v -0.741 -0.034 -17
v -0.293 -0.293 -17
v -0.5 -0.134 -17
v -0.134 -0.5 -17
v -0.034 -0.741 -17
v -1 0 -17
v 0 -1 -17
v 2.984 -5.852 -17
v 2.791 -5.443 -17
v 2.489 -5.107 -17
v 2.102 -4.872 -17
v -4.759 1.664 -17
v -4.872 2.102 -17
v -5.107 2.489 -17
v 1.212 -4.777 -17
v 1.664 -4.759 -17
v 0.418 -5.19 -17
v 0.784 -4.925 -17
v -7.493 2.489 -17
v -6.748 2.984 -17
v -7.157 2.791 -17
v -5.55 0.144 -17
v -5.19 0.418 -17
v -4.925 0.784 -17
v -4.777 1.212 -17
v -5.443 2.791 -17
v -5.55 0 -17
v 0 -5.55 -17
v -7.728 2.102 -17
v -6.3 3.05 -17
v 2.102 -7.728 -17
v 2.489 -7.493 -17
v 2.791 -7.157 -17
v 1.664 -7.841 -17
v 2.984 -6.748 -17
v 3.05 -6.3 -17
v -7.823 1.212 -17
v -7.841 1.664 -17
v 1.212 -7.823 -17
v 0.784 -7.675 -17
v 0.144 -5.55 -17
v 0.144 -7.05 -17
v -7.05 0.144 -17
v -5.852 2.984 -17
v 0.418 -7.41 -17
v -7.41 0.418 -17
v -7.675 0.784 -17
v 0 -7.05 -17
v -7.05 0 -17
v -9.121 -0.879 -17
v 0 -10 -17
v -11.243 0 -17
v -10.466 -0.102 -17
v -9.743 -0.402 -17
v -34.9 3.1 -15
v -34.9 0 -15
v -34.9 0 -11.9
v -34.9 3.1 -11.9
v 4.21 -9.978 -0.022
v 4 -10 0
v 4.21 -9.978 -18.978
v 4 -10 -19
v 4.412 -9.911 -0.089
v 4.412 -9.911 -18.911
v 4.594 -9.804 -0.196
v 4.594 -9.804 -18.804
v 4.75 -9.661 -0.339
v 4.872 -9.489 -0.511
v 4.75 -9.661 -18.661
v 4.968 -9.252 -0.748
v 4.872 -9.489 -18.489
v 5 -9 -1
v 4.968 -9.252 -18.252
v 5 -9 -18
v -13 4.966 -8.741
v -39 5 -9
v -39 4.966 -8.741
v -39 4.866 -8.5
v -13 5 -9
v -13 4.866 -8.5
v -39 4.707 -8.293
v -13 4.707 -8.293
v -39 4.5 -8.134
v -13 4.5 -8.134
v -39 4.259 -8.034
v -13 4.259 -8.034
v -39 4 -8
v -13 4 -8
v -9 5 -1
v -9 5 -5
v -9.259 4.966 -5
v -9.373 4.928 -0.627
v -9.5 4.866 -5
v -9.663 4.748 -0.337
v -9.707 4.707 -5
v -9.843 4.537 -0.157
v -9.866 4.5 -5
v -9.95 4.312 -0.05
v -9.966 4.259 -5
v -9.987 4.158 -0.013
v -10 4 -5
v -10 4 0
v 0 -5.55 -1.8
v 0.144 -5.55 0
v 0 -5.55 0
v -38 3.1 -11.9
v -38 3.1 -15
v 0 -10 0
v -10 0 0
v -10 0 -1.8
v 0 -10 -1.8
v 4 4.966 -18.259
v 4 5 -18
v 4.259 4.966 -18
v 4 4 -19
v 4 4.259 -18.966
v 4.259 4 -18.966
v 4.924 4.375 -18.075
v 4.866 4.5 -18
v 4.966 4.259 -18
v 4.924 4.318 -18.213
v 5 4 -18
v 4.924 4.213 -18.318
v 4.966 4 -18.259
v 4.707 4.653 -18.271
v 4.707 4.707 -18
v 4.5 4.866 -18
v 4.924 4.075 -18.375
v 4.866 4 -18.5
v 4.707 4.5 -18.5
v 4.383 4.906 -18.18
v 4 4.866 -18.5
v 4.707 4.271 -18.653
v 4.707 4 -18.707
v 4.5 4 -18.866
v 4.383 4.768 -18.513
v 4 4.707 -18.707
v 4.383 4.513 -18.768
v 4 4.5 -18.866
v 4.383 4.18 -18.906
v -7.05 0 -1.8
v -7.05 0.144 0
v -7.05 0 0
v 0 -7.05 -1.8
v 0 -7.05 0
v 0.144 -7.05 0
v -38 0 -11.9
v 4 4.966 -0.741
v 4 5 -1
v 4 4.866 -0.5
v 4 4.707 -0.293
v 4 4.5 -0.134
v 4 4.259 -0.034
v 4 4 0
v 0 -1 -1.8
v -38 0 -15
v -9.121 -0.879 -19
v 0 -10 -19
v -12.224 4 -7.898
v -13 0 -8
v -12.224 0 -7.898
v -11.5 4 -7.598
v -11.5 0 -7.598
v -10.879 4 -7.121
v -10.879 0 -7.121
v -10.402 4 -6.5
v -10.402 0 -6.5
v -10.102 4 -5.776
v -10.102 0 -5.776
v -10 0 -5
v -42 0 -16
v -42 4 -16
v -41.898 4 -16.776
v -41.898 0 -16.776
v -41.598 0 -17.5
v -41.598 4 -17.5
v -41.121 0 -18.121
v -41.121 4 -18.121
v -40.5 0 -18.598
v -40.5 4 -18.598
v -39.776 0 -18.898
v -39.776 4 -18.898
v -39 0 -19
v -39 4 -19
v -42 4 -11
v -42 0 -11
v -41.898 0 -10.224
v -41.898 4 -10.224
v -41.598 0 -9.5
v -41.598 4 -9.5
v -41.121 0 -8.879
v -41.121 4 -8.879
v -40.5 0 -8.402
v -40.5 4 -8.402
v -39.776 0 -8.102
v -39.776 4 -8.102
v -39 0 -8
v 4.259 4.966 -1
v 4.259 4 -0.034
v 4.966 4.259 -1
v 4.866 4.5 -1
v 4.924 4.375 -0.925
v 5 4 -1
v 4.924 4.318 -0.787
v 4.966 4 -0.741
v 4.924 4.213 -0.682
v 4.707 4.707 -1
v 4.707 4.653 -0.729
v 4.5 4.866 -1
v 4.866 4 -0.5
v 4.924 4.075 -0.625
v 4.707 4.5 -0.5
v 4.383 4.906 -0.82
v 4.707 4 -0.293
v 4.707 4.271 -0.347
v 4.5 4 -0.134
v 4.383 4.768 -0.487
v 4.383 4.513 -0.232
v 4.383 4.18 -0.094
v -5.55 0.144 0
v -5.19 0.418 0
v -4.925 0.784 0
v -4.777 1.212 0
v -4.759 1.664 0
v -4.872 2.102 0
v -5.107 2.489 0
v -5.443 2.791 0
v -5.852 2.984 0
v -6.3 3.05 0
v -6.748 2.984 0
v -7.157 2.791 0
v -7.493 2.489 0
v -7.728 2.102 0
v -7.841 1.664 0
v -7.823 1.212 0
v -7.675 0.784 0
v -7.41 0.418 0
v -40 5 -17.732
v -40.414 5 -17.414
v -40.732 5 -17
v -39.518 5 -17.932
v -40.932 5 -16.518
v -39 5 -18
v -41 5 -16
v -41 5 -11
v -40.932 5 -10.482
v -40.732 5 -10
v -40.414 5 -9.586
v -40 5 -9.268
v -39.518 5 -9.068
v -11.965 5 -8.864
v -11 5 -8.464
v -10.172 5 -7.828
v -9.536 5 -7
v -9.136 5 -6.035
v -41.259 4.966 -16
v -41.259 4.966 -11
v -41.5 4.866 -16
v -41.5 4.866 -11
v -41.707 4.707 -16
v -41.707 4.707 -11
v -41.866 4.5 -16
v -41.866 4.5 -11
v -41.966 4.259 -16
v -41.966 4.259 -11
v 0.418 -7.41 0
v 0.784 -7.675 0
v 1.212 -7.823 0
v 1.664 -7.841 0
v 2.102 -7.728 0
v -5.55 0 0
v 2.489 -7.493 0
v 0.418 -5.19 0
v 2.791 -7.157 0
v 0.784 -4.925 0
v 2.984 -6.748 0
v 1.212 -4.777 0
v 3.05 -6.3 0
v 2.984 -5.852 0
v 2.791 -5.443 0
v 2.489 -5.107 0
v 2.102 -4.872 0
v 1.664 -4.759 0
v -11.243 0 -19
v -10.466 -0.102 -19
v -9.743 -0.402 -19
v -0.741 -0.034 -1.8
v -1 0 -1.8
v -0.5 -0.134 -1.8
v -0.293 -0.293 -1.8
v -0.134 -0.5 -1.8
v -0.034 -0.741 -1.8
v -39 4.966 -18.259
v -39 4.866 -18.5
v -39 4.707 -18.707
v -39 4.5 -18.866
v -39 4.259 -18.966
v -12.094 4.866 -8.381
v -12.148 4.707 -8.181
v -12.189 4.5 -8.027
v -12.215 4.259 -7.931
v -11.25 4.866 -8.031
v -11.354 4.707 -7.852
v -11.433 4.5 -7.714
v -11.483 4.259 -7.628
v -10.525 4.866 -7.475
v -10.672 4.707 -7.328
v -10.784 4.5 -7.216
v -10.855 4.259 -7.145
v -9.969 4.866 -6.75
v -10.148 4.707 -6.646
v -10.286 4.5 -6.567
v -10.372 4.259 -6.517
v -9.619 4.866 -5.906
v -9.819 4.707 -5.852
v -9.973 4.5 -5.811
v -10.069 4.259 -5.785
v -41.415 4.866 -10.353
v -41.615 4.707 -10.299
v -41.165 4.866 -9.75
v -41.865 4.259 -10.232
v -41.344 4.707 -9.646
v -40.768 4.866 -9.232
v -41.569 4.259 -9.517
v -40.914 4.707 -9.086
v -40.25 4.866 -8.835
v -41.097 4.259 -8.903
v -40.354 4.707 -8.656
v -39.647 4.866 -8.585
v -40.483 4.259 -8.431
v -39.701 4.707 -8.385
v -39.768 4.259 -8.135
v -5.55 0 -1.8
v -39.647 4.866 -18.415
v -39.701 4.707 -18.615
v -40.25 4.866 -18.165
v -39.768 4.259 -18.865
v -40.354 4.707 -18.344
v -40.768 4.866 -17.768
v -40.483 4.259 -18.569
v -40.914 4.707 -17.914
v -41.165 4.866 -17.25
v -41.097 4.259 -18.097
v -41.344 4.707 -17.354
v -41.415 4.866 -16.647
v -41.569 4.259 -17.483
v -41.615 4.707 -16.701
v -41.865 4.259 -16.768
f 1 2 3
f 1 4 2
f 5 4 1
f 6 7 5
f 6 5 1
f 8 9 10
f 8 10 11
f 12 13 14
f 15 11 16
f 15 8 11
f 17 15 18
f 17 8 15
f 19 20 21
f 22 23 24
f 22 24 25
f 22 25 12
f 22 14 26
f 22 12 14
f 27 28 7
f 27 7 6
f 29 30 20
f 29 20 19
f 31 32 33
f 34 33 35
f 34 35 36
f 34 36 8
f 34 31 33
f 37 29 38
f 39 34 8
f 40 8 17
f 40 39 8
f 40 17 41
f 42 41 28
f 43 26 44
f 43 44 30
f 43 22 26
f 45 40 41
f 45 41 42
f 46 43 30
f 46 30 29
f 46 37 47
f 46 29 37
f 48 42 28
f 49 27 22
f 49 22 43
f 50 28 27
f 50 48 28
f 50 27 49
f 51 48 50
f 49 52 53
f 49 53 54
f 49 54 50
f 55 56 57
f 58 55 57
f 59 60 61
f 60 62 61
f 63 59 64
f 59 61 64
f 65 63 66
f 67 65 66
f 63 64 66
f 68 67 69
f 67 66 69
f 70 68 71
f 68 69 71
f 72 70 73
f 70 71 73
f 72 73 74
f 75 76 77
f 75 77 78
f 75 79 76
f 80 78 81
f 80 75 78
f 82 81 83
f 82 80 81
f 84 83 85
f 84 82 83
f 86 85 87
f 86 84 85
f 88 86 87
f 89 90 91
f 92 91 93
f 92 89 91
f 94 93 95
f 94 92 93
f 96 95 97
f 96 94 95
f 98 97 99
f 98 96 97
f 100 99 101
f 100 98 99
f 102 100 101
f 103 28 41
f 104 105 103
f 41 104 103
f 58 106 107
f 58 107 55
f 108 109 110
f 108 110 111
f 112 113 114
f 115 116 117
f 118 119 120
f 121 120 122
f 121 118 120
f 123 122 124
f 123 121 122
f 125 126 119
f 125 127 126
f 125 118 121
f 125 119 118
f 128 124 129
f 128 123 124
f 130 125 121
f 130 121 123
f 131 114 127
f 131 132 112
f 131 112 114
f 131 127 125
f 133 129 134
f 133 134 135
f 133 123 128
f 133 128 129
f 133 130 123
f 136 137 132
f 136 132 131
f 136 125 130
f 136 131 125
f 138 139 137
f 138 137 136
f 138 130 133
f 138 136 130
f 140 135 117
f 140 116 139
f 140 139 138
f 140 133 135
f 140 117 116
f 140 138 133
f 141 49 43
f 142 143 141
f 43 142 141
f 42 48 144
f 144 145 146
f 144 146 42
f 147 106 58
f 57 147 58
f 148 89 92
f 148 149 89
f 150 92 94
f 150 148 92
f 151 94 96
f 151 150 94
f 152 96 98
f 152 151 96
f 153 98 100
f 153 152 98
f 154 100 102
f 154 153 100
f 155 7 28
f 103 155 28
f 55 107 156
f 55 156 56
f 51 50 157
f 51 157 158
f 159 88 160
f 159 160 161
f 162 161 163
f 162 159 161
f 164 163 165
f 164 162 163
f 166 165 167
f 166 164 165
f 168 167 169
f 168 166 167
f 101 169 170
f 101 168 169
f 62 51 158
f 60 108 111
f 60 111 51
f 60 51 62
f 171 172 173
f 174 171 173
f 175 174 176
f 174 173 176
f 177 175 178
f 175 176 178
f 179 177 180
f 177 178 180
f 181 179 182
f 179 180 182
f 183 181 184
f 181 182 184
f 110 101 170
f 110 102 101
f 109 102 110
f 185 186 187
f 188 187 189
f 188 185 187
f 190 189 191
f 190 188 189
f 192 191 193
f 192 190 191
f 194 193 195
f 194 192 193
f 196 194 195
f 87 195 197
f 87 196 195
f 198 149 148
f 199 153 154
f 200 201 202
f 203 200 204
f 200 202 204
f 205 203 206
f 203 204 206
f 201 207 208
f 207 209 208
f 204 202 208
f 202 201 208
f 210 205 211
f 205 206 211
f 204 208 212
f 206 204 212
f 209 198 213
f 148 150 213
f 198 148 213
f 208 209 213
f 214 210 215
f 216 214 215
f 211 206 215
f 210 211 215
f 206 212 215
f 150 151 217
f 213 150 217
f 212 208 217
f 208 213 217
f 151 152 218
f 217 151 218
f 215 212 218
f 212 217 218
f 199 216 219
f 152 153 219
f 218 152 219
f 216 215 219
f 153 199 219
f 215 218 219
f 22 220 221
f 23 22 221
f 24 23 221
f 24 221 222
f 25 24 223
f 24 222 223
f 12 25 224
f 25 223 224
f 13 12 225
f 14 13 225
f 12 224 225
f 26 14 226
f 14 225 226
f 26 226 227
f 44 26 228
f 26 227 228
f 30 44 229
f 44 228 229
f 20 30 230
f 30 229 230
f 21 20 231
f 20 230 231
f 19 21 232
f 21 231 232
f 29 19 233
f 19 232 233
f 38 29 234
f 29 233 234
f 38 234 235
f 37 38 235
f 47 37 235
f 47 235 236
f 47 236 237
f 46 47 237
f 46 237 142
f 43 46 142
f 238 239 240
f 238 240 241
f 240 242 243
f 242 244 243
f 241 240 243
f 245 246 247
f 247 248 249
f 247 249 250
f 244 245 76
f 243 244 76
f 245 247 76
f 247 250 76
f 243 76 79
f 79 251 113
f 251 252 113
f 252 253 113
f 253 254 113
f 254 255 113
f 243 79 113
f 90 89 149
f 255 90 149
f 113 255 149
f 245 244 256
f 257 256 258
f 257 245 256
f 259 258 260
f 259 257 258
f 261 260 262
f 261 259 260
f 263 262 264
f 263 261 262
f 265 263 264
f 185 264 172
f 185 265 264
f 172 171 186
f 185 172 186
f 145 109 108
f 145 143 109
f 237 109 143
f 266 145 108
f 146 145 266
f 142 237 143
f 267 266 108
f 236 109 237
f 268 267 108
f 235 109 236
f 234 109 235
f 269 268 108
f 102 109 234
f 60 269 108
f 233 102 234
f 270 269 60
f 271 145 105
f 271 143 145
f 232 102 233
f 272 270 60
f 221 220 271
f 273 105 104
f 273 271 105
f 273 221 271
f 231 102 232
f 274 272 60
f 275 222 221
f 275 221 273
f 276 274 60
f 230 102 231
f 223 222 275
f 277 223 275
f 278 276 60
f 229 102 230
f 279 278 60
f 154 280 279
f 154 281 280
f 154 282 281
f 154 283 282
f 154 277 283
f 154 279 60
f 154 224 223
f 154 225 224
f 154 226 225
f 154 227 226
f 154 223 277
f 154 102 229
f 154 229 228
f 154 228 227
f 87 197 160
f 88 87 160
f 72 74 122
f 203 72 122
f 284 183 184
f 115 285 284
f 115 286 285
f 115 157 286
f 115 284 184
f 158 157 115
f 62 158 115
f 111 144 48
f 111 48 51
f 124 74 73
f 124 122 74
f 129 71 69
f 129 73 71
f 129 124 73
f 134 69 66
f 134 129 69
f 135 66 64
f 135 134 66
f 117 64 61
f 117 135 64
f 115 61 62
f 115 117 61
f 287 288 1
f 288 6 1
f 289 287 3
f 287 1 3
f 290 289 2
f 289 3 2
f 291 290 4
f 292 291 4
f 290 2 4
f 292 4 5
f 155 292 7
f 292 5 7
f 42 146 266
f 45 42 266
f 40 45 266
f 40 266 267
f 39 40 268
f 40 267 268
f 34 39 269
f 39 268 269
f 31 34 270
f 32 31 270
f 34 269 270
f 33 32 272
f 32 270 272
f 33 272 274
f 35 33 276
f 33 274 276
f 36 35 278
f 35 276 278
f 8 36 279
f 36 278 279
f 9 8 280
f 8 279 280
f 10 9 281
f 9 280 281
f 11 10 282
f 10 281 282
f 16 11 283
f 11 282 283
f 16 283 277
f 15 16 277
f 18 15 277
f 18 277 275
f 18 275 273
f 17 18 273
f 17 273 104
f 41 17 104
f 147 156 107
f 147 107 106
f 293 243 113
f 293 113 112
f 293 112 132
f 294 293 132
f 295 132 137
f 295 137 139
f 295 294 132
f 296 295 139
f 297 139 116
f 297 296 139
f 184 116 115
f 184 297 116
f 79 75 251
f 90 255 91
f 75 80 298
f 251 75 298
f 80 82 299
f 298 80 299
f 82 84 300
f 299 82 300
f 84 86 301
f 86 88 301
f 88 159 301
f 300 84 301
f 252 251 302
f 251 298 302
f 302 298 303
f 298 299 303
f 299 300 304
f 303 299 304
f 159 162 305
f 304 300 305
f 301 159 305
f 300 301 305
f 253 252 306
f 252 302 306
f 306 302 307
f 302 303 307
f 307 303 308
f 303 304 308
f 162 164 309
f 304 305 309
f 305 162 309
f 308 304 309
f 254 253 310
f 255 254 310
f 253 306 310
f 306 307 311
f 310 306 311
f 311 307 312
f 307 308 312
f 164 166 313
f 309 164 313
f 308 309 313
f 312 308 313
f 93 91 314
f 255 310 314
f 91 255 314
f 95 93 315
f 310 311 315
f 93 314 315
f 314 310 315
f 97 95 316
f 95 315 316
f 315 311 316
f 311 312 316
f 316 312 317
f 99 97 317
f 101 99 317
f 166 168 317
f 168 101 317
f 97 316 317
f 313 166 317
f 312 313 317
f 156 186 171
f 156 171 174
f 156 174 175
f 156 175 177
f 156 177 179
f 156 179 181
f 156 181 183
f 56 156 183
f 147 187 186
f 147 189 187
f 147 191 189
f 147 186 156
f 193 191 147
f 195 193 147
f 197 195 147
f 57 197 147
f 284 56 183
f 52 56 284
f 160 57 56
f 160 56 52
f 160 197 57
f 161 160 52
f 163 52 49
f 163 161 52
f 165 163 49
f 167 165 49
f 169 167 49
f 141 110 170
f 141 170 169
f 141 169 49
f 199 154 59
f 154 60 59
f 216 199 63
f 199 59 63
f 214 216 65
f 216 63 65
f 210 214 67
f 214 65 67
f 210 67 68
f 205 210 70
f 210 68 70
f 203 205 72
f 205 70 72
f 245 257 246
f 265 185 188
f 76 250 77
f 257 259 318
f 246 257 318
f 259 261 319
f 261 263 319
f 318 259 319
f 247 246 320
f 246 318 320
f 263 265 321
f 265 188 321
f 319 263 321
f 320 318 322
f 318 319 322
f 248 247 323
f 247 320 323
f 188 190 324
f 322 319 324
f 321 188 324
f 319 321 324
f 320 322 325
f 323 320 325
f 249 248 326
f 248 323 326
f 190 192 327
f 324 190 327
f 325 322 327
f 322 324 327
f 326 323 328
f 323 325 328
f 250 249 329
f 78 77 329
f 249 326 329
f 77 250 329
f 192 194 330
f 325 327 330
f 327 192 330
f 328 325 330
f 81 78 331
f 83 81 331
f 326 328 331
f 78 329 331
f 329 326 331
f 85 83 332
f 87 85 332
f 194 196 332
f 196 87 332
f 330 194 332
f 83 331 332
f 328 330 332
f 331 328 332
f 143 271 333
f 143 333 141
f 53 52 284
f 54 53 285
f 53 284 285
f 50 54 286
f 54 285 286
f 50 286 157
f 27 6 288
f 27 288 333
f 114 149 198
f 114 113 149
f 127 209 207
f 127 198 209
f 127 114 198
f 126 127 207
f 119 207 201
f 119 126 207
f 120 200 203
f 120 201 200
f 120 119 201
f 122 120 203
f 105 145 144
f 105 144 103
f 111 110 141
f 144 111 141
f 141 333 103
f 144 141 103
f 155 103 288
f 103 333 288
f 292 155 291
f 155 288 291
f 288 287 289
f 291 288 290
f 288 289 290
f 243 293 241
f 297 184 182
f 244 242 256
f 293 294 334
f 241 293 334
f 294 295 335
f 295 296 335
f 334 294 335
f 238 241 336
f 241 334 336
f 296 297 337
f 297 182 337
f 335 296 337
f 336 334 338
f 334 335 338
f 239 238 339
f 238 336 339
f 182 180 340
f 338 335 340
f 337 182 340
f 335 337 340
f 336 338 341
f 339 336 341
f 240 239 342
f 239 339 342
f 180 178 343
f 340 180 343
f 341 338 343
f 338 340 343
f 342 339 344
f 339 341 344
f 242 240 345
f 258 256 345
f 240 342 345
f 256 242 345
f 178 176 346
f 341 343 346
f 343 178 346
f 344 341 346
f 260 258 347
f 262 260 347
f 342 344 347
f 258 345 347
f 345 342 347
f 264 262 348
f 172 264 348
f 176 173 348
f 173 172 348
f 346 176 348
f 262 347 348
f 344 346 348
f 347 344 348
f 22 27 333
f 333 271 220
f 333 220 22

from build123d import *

# Parameters (mm, degrees)
PAD_DEPTH    = 17
PAD001_DEPTH = 2
PAD002_DEPTH = 1.8
SKETCH003_W  = 32
SKETCH003_H  = 11
PAD003_DEPTH = 5
SKETCH004_W  = 3.1
SKETCH004_H  = 3.1
POCKET_DEPTH = 3.1
FILLET_R     = 3
FILLET001_R  = 1


with BuildPart() as part:
    # Sketch → Pad (new body)
    with BuildSketch(Plane.XY):
        with BuildLine():
            Line((-10, 0), (-10, 5))
            Line((-10, 5), (5, 5))
            Line((5, 5), (5, -10))
            Line((5, -10), (0, -10))
            Line((0, -7.05), (0, -10))
            Line((0, -7.05), (0.143534, -7.05))
            ThreePointArc((0.143534, -7.05), (3.05, -6.3), (0.143534, -5.55))
            Line((0, -5.55), (0.143534, -5.55))
            Line((0, 0), (0, -5.55))
            Line((0, 0), (-5.55, 0))
            Line((-5.55, 0), (-5.55, 0.143534))
            ThreePointArc((-5.55, 0.143534), (-6.3, 3.05), (-7.05, 0.143534))
            Line((-7.05, 0), (-7.05, 0.143534))
            Line((-10, 0), (-7.05, 0))
        make_face()
    extrude(amount=-PAD_DEPTH)

    # Sketch001 (on Face16 of Pad) → Pad001 (join)
    with BuildSketch(Plane(origin=(0, 0, -17), x_dir=(1, 0, 0), z_dir=(0, 0, -1))):
        Polygon((5, -5), (-10, -5), (-10, 0), (0, 10), (5, 10), align=None)
    extrude(amount=PAD001_DEPTH)

    # Sketch002 (on Face1 of Pad001) → Pad002 (join)
    with BuildSketch(Plane.XY):
        Polygon((0, -10), (0, 0), (-10, 0), align=None)
    extrude(amount=-PAD002_DEPTH)

    # Sketch003 (on Face10 of Pad002) → Pad003 (join)
    with BuildSketch(Plane.XZ):
        with Locations((-26, -13.5)):
            Rectangle(SKETCH003_W, SKETCH003_H)
    extrude(amount=-PAD003_DEPTH)

    # Sketch004 (on Face22 of Pad003) → Pocket (cut)
    with BuildSketch(Plane.XZ):
        with Locations((-36.45, -13.45)):
            Rectangle(SKETCH004_W, SKETCH004_H)
    extrude(amount=-POCKET_DEPTH, mode=Mode.SUBTRACT)

    # Fillet
    fillet_edges = [part.edges().sort_by_distance(p)[0] for p in [
        (-10, 2.5, -8),
        (-42, 2.5, -8),
        (-42, 2.5, -19),
        (-10, 0, -18),
    ]]
    fillet(fillet_edges, radius=FILLET_R)

    # Fillet001
    fillet001_edges = [part.edges().sort_by_distance(p)[0] for p in [
        (-10, 5, -2.5),
        (-10.87868, 5, -7.12132),
        (-2.5, 5, 0),
        (-26, 5, -8),
        (5, 5, -9.5),
        (-41.12132, 5, -8.87868),
        (-17, 5, -19),
        (-42, 5, -13.5),
        (-41.12132, 5, -18.12132),
        (5, -2.5, 0),
        (5, -10, -9.5),
        (5, -2.5, -19),
        (0, 0, -9.4),
    ]]
    fillet(fillet001_edges, radius=FILLET001_R)


solid = part.part
